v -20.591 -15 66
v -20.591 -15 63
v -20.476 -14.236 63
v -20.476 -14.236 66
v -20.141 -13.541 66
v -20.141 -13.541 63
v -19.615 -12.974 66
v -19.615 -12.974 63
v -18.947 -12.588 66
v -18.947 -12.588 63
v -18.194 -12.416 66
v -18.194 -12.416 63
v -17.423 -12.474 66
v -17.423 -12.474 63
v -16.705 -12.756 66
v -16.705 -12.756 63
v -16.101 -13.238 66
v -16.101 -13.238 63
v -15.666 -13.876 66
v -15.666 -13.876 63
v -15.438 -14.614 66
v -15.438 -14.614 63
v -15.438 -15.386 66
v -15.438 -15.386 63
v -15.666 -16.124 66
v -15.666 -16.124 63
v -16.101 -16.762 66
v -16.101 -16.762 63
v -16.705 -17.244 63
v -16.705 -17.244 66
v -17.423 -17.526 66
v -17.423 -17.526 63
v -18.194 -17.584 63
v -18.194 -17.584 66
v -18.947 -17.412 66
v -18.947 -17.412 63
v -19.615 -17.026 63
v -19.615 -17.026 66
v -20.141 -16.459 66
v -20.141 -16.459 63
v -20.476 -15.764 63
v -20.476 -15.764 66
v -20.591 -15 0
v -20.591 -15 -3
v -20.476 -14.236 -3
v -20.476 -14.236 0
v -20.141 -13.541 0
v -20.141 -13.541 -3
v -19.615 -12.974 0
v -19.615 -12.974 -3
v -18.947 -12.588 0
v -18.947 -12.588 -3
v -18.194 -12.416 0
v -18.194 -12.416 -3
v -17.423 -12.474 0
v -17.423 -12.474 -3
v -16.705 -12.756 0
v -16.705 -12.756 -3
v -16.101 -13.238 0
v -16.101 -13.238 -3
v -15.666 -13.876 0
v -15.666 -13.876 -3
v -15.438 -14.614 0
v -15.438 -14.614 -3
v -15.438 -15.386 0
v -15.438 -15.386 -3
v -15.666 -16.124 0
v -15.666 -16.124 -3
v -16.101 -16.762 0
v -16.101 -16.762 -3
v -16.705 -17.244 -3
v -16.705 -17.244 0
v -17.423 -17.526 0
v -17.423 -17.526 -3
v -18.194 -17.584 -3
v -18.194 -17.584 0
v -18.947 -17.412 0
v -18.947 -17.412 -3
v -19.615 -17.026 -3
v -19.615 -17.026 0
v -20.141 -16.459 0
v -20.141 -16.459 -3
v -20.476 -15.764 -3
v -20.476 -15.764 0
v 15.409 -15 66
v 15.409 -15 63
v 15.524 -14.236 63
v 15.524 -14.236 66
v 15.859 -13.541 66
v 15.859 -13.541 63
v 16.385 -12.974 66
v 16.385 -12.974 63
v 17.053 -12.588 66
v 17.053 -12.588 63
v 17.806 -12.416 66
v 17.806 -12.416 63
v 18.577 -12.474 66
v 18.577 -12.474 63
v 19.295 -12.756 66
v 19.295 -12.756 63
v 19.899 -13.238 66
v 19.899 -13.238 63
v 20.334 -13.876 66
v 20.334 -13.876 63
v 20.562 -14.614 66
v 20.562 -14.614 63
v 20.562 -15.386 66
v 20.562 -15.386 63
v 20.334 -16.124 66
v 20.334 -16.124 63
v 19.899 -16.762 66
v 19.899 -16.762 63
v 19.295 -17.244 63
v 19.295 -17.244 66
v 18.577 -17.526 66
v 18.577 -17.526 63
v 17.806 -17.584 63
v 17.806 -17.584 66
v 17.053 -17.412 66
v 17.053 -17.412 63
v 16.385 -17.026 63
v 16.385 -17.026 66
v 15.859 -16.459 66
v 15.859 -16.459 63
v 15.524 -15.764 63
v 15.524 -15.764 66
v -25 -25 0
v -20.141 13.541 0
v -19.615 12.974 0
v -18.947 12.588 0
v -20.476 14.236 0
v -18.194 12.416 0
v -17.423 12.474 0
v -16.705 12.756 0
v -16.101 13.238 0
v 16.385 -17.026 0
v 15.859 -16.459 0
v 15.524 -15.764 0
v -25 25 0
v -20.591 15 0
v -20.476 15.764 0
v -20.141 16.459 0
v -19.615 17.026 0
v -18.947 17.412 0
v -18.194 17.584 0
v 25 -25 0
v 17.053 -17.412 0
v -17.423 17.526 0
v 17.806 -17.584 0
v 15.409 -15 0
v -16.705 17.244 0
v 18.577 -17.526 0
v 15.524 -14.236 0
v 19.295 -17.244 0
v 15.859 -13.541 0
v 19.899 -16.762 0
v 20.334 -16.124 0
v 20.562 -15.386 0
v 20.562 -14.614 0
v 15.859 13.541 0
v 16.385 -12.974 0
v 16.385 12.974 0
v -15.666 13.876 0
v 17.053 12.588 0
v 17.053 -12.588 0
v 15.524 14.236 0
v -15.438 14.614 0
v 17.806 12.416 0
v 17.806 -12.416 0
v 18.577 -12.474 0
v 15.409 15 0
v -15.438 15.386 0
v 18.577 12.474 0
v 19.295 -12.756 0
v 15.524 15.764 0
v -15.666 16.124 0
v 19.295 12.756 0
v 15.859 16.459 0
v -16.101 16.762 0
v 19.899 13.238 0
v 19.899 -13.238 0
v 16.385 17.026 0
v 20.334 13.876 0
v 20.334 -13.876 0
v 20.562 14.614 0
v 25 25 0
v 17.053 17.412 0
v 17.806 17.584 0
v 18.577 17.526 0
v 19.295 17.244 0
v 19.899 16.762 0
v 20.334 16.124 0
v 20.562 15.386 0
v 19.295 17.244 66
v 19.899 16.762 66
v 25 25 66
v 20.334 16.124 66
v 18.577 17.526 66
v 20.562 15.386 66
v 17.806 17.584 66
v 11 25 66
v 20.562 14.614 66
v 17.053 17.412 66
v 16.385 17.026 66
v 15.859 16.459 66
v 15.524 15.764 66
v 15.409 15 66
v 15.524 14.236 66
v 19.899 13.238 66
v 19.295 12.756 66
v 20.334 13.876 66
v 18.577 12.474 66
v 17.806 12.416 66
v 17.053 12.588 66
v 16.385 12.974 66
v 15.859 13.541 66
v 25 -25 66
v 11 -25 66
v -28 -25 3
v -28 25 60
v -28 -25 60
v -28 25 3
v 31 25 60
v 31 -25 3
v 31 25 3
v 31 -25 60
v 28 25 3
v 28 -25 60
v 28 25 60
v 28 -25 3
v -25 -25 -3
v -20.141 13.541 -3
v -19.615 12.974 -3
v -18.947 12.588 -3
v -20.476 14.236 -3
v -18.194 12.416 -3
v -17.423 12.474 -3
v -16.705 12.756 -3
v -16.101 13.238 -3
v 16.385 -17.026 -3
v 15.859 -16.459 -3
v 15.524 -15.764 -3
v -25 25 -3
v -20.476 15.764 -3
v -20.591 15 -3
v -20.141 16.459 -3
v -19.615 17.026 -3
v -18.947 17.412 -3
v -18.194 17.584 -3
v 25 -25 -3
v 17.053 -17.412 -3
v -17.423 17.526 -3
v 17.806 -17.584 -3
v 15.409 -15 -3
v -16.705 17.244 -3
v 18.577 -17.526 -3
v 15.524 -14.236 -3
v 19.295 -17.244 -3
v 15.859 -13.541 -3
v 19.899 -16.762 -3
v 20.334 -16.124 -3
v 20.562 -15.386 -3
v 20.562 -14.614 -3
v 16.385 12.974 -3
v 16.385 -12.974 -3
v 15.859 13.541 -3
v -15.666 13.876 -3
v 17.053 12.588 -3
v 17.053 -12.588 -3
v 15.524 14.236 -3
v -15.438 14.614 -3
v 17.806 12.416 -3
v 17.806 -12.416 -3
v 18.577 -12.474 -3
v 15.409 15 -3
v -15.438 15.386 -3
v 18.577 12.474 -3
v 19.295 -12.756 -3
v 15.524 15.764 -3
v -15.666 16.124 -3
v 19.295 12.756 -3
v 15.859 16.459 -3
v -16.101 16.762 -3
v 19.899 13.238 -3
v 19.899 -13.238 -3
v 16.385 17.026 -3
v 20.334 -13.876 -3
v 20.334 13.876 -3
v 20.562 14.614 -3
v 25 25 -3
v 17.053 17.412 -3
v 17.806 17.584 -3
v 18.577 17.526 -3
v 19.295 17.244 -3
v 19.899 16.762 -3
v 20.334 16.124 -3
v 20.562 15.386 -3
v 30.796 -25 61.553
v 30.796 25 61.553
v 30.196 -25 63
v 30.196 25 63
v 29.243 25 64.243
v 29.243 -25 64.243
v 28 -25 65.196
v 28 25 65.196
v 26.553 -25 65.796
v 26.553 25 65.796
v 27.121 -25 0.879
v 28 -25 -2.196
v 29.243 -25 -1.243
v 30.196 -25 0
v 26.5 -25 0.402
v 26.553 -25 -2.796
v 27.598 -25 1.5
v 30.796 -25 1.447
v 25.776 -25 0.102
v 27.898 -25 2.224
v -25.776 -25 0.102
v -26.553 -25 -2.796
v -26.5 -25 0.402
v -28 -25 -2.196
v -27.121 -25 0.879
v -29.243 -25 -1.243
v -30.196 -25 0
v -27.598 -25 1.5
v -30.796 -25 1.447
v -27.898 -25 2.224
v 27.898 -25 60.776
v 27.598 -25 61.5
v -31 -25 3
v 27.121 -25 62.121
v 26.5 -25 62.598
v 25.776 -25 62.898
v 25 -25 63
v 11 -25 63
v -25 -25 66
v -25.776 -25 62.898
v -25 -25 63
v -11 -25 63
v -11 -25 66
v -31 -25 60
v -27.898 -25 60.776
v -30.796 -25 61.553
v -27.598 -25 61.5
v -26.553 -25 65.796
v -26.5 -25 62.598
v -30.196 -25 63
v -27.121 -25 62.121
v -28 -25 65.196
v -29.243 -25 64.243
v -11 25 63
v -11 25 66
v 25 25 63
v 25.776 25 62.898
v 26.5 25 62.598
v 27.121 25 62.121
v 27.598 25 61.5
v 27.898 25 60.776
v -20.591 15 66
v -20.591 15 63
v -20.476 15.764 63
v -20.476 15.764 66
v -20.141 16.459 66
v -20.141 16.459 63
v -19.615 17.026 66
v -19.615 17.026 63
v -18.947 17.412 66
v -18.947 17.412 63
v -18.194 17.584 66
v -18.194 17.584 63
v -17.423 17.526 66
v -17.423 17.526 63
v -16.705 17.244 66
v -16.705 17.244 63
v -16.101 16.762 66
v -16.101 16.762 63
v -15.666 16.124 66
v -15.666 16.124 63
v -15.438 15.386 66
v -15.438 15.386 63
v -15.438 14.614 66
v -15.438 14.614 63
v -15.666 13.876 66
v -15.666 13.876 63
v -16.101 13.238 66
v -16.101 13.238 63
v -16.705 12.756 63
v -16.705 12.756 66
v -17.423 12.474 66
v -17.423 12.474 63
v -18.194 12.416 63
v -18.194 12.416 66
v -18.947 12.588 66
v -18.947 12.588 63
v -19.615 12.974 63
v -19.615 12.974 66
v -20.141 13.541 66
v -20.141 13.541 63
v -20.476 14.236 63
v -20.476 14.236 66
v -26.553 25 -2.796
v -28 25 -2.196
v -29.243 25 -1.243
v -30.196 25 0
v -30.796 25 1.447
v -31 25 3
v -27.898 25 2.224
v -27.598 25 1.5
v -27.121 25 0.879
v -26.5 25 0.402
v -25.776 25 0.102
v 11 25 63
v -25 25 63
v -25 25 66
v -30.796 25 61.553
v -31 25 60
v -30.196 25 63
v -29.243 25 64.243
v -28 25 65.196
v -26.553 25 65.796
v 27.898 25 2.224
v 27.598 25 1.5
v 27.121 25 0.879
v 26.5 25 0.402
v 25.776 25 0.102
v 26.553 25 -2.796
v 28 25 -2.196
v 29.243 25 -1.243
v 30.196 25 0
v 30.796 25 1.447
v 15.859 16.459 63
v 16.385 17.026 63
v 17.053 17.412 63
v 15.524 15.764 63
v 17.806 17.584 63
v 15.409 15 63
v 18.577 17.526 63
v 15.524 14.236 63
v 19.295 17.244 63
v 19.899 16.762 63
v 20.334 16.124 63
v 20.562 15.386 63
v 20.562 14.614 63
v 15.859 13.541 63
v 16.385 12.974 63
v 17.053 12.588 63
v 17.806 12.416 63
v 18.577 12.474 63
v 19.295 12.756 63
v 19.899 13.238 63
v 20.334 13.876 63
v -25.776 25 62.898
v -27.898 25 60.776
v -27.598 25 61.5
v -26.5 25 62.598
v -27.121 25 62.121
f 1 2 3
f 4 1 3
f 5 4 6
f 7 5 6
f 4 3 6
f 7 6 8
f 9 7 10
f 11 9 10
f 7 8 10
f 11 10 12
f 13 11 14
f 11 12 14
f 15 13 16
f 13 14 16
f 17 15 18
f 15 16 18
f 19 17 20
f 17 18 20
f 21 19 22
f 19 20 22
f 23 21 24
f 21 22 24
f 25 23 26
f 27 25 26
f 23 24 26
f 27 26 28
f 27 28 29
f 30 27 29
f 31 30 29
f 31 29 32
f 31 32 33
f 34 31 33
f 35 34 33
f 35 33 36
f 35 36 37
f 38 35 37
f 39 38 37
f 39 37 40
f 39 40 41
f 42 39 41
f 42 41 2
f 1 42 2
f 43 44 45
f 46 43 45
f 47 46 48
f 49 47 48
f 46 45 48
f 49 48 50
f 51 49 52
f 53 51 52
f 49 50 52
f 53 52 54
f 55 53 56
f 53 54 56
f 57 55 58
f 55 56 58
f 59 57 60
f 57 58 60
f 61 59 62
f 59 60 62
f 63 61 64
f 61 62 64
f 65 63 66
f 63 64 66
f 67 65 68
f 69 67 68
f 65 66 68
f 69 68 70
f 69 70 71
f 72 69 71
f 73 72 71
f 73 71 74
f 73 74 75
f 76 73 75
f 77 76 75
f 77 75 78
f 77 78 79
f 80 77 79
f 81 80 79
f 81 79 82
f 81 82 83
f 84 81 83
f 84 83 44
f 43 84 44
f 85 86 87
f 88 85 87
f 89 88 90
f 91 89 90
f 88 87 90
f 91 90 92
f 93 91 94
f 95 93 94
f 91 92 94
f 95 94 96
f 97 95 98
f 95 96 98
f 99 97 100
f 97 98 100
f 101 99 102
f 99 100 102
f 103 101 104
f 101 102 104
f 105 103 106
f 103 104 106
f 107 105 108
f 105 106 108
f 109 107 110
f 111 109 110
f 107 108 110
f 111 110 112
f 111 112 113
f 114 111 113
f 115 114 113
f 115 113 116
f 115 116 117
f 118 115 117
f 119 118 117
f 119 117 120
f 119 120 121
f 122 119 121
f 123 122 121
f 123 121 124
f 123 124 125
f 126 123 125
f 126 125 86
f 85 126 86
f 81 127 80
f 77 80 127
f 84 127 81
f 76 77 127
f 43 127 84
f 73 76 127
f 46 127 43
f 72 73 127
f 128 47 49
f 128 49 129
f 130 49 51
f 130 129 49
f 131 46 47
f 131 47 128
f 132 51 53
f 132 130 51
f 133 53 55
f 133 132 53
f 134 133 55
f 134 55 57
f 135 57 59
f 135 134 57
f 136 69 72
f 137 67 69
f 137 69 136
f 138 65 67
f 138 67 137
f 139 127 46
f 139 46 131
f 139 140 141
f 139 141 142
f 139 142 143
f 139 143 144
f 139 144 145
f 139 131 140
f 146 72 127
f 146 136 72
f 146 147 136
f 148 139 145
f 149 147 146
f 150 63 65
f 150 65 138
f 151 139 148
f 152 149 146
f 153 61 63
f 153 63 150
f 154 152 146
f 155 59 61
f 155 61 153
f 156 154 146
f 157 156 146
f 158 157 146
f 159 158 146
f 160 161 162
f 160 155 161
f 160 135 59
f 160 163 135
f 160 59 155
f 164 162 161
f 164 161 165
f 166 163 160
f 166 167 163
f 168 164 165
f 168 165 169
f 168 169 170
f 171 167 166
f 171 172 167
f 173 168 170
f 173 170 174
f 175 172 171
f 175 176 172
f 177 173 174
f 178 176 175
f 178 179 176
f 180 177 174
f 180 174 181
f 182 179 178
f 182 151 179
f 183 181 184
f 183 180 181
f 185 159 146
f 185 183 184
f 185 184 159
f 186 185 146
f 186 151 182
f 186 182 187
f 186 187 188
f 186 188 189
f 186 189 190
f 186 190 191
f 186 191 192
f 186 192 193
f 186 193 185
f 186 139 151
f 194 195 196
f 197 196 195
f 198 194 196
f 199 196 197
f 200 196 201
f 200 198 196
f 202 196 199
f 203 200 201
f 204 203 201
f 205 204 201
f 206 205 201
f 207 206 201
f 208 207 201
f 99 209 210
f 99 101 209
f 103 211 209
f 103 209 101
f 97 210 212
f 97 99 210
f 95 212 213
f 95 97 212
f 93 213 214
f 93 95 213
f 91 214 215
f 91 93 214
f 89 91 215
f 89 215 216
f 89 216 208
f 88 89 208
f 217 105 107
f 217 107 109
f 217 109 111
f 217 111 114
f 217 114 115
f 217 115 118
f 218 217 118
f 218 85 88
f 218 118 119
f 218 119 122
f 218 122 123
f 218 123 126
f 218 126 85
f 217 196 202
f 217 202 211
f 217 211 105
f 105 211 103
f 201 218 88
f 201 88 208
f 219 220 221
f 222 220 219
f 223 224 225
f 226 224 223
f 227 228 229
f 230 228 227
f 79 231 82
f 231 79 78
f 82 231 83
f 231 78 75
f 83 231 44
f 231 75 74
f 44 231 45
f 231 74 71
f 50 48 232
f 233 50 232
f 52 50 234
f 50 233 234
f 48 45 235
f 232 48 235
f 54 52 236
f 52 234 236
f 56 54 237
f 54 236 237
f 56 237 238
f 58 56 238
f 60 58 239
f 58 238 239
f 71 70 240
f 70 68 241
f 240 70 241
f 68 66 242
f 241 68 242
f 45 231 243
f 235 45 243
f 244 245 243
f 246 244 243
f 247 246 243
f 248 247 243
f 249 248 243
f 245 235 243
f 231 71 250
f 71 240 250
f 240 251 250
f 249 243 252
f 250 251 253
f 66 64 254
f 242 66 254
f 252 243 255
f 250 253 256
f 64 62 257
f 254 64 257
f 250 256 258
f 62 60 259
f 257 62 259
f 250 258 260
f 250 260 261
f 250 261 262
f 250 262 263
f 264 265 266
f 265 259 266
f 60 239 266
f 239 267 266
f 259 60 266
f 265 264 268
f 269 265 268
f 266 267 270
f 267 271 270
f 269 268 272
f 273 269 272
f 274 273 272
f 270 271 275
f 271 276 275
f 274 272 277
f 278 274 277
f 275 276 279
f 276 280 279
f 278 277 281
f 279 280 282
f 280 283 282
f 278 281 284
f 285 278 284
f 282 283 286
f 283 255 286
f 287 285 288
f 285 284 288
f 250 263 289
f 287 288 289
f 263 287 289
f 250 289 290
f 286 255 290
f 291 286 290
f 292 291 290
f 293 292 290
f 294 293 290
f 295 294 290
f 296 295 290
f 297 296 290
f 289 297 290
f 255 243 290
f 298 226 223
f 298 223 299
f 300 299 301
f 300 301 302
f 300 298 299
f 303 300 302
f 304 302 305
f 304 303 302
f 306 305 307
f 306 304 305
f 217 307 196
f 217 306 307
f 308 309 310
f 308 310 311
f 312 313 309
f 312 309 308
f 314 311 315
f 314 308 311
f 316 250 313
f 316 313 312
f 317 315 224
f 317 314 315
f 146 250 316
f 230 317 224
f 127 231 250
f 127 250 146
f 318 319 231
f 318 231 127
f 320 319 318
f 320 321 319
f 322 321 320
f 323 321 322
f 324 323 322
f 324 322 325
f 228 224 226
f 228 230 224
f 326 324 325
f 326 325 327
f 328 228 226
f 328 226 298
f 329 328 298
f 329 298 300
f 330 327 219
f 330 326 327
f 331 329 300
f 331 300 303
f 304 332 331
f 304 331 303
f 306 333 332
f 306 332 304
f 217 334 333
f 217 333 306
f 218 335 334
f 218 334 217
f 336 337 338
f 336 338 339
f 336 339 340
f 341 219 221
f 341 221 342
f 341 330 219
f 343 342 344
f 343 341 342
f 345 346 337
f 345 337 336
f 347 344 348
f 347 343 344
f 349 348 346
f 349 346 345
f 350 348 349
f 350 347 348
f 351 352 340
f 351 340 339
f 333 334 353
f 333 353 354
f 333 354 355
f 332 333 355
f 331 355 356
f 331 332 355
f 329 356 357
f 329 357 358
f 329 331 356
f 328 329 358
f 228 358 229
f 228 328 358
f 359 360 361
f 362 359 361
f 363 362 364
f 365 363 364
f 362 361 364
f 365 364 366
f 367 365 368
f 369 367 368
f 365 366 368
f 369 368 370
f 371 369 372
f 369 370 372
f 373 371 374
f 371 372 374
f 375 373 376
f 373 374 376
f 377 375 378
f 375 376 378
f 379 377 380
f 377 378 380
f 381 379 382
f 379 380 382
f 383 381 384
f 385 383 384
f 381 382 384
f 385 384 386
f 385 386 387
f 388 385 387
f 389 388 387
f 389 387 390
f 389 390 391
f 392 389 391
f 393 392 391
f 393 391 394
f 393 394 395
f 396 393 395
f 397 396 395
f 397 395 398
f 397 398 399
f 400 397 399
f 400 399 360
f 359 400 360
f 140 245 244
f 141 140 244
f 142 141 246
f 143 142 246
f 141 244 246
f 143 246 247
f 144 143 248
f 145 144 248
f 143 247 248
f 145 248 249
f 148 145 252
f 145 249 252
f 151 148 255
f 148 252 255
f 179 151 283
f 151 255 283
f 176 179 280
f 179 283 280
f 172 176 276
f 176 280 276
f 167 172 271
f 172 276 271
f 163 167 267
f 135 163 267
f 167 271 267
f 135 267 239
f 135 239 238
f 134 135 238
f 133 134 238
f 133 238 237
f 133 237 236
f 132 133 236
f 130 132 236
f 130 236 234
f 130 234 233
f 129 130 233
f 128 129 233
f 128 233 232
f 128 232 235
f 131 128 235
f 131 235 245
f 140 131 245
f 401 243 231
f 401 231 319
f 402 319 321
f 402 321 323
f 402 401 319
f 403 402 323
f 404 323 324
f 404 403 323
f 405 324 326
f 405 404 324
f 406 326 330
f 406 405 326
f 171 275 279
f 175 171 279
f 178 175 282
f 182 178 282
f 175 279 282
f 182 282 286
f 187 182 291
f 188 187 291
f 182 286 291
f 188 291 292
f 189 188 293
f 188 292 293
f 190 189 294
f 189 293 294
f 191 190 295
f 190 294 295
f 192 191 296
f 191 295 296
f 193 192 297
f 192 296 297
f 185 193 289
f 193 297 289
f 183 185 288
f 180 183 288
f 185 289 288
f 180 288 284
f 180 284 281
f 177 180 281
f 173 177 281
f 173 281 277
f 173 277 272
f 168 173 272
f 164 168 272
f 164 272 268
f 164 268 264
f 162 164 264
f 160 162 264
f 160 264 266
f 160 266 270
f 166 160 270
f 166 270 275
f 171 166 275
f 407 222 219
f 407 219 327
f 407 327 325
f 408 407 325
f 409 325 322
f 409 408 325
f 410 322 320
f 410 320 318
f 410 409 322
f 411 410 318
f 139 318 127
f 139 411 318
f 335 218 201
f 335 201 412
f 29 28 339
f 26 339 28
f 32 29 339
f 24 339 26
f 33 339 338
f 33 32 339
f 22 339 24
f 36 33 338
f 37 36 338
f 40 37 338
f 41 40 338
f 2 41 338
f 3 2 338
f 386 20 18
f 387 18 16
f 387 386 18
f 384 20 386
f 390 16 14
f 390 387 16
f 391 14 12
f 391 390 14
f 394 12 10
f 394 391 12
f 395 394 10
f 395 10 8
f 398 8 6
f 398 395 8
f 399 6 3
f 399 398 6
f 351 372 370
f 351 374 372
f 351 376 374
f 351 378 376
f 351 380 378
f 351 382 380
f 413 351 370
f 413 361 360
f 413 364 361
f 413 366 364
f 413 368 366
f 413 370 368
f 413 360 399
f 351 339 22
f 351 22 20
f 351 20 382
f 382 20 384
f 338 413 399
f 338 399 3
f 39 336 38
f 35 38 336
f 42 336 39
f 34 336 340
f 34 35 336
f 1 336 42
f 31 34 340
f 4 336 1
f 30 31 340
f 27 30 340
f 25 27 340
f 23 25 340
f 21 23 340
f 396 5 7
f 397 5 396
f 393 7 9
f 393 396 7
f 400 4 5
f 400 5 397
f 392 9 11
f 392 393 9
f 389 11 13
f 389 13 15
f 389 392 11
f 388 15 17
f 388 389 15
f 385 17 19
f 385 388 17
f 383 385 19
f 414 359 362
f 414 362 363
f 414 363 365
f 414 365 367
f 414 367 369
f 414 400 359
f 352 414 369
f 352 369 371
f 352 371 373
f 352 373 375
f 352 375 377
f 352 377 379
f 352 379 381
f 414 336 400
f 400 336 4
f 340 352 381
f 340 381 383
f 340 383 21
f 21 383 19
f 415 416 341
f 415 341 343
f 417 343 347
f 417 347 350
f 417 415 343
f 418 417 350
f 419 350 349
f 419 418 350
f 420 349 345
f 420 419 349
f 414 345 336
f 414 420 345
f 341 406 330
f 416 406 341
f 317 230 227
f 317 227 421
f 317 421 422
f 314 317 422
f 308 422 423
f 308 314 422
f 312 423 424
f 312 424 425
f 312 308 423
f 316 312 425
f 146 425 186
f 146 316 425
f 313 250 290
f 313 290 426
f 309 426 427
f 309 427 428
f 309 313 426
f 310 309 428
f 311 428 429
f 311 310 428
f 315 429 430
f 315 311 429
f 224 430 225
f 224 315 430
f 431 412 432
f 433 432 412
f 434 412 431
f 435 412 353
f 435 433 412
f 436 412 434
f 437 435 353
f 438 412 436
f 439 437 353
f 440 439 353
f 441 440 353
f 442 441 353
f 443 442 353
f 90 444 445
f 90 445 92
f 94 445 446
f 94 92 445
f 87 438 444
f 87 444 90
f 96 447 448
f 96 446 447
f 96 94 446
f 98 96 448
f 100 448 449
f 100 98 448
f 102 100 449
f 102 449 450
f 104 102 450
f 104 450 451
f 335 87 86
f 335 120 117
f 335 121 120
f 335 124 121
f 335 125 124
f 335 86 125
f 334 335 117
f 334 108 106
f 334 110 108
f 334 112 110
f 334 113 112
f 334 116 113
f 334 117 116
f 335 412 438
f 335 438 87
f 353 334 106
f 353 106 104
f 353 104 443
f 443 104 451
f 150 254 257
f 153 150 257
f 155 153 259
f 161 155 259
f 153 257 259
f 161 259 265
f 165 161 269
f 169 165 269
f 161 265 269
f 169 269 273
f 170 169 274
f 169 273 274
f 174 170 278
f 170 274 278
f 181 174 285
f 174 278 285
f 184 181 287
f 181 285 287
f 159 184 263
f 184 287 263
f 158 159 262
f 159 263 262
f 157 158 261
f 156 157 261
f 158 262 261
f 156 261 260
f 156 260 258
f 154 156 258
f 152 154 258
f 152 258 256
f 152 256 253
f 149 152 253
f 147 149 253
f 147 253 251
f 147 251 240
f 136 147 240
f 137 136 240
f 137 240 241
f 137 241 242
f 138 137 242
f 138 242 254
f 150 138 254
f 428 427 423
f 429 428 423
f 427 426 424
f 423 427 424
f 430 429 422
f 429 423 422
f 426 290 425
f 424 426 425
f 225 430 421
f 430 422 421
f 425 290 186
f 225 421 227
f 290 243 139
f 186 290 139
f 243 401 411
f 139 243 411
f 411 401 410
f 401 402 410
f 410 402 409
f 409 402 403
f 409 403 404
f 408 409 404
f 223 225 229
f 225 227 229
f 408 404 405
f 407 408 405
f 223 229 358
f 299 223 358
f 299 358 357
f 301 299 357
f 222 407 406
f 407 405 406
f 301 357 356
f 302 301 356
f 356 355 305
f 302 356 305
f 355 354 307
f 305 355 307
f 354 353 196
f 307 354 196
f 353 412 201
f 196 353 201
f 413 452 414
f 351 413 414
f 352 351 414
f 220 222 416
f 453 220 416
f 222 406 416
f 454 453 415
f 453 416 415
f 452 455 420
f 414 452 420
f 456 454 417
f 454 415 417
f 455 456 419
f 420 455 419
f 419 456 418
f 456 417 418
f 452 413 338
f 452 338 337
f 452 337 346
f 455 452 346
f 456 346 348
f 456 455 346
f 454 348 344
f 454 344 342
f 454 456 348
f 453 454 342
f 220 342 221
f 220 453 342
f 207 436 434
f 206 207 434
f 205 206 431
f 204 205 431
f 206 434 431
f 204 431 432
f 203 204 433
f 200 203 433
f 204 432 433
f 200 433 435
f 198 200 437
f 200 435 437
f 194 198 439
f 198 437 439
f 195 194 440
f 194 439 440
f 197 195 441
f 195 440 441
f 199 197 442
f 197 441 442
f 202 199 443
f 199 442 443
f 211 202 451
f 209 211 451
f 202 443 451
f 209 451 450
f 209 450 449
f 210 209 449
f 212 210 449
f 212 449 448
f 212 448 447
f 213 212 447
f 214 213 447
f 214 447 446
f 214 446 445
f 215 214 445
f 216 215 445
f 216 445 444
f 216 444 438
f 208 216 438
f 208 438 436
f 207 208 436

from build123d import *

# Parameters (mm, degrees)
SKETCH1_W                  = 50
SKETCH1_H                  = 50
BASE_FLANGE1_DEPTH         = 3
EDGE_FLANGE1_DEPTH         = 50
EDGE_FLANGE2_DEPTH         = 50
EDGE_FLANGE3_DEPTH         = 50
EDGE_FLANGE4_DEPTH         = 50
F_6_0_204_DIAMETER_SLOT1_D = 5.1816


# Sheet-metal steps are written as plain solids
with BuildPart() as part:
    # Sketch1 → Base-Flange1 (new body)
    with BuildSketch(Plane.XY):
        Rectangle(SKETCH1_W, SKETCH1_H)
    extrude(amount=-BASE_FLANGE1_DEPTH)

    # Edge-Flange1 section (across the edge) → Edge-Flange1 (add)
    with BuildSketch(Plane(origin=(28, -25, 0), x_dir=(-1, 0, 0), z_dir=(0, 1, 0))):
        with BuildLine():
            Line((-3, 3), (-3, 60))
            Line((-3, 60), (0, 60))
            Line((0, 60), (0, 3))
            ThreePointArc((0, 3), (0.878679656, 0.878679656), (3, 0))
            Line((3, 0), (3, -3))
            ThreePointArc((3, -3), (-1.242640687, -1.242640687), (-3, 3))
        make_face()
    extrude(amount=EDGE_FLANGE1_DEPTH)

    # Edge-Flange2 section (across the edge) → Edge-Flange2 (add)
    with BuildSketch(Plane(origin=(-28, 25, 0), x_dir=(1, 0, 0), z_dir=(0, -1, 0))):
        with BuildLine():
            Line((-3, 3), (-3, 60))
            Line((-3, 60), (0, 60))
            Line((0, 60), (0, 3))
            ThreePointArc((0, 3), (0.878679656, 0.878679656), (3, 0))
            Line((3, 0), (3, -3))
            ThreePointArc((3, -3), (-1.242640687, -1.242640687), (-3, 3))
        make_face()
    extrude(amount=EDGE_FLANGE2_DEPTH)

    # Edge-Flange3 section (across the edge) → Edge-Flange3 (add)
    with BuildSketch(Plane(origin=(-28, 25, 63), x_dir=(0, 0, -1), z_dir=(0, -1, 0))):
        with BuildLine():
            Line((-3, 3), (-3, 17))
            Line((-3, 17), (0, 17))
            Line((0, 17), (0, 3))
            ThreePointArc((0, 3), (0.878679656, 0.878679656), (3, 0))
            Line((3, 0), (3, -3))
            ThreePointArc((3, -3), (-1.242640687, -1.242640687), (-3, 3))
        make_face()
    extrude(amount=EDGE_FLANGE3_DEPTH)

    # Edge-Flange4 section (across the edge) → Edge-Flange4 (add)
    with BuildSketch(Plane(origin=(28, -25, 63), x_dir=(0, 0, -1), z_dir=(0, 1, 0))):
        with BuildLine():
            Line((-3, 3), (-3, 17))
            Line((-3, 17), (0, 17))
            Line((0, 17), (0, 3))
            ThreePointArc((0, 3), (0.878679656, 0.878679656), (3, 0))
            Line((3, 0), (3, -3))
            ThreePointArc((3, -3), (-1.242640687, -1.242640687), (-3, 3))
        make_face()
    extrude(amount=EDGE_FLANGE4_DEPTH)

    # #6 (0.204) Diameter Slot1 (through all)
    with Locations(Plane.XY.offset(66)):
        with Locations((-18, 15), (-18, -15), (18, 15), (18, -15)):
            Hole(F_6_0_204_DIAMETER_SLOT1_D / 2)


solid = part.part
